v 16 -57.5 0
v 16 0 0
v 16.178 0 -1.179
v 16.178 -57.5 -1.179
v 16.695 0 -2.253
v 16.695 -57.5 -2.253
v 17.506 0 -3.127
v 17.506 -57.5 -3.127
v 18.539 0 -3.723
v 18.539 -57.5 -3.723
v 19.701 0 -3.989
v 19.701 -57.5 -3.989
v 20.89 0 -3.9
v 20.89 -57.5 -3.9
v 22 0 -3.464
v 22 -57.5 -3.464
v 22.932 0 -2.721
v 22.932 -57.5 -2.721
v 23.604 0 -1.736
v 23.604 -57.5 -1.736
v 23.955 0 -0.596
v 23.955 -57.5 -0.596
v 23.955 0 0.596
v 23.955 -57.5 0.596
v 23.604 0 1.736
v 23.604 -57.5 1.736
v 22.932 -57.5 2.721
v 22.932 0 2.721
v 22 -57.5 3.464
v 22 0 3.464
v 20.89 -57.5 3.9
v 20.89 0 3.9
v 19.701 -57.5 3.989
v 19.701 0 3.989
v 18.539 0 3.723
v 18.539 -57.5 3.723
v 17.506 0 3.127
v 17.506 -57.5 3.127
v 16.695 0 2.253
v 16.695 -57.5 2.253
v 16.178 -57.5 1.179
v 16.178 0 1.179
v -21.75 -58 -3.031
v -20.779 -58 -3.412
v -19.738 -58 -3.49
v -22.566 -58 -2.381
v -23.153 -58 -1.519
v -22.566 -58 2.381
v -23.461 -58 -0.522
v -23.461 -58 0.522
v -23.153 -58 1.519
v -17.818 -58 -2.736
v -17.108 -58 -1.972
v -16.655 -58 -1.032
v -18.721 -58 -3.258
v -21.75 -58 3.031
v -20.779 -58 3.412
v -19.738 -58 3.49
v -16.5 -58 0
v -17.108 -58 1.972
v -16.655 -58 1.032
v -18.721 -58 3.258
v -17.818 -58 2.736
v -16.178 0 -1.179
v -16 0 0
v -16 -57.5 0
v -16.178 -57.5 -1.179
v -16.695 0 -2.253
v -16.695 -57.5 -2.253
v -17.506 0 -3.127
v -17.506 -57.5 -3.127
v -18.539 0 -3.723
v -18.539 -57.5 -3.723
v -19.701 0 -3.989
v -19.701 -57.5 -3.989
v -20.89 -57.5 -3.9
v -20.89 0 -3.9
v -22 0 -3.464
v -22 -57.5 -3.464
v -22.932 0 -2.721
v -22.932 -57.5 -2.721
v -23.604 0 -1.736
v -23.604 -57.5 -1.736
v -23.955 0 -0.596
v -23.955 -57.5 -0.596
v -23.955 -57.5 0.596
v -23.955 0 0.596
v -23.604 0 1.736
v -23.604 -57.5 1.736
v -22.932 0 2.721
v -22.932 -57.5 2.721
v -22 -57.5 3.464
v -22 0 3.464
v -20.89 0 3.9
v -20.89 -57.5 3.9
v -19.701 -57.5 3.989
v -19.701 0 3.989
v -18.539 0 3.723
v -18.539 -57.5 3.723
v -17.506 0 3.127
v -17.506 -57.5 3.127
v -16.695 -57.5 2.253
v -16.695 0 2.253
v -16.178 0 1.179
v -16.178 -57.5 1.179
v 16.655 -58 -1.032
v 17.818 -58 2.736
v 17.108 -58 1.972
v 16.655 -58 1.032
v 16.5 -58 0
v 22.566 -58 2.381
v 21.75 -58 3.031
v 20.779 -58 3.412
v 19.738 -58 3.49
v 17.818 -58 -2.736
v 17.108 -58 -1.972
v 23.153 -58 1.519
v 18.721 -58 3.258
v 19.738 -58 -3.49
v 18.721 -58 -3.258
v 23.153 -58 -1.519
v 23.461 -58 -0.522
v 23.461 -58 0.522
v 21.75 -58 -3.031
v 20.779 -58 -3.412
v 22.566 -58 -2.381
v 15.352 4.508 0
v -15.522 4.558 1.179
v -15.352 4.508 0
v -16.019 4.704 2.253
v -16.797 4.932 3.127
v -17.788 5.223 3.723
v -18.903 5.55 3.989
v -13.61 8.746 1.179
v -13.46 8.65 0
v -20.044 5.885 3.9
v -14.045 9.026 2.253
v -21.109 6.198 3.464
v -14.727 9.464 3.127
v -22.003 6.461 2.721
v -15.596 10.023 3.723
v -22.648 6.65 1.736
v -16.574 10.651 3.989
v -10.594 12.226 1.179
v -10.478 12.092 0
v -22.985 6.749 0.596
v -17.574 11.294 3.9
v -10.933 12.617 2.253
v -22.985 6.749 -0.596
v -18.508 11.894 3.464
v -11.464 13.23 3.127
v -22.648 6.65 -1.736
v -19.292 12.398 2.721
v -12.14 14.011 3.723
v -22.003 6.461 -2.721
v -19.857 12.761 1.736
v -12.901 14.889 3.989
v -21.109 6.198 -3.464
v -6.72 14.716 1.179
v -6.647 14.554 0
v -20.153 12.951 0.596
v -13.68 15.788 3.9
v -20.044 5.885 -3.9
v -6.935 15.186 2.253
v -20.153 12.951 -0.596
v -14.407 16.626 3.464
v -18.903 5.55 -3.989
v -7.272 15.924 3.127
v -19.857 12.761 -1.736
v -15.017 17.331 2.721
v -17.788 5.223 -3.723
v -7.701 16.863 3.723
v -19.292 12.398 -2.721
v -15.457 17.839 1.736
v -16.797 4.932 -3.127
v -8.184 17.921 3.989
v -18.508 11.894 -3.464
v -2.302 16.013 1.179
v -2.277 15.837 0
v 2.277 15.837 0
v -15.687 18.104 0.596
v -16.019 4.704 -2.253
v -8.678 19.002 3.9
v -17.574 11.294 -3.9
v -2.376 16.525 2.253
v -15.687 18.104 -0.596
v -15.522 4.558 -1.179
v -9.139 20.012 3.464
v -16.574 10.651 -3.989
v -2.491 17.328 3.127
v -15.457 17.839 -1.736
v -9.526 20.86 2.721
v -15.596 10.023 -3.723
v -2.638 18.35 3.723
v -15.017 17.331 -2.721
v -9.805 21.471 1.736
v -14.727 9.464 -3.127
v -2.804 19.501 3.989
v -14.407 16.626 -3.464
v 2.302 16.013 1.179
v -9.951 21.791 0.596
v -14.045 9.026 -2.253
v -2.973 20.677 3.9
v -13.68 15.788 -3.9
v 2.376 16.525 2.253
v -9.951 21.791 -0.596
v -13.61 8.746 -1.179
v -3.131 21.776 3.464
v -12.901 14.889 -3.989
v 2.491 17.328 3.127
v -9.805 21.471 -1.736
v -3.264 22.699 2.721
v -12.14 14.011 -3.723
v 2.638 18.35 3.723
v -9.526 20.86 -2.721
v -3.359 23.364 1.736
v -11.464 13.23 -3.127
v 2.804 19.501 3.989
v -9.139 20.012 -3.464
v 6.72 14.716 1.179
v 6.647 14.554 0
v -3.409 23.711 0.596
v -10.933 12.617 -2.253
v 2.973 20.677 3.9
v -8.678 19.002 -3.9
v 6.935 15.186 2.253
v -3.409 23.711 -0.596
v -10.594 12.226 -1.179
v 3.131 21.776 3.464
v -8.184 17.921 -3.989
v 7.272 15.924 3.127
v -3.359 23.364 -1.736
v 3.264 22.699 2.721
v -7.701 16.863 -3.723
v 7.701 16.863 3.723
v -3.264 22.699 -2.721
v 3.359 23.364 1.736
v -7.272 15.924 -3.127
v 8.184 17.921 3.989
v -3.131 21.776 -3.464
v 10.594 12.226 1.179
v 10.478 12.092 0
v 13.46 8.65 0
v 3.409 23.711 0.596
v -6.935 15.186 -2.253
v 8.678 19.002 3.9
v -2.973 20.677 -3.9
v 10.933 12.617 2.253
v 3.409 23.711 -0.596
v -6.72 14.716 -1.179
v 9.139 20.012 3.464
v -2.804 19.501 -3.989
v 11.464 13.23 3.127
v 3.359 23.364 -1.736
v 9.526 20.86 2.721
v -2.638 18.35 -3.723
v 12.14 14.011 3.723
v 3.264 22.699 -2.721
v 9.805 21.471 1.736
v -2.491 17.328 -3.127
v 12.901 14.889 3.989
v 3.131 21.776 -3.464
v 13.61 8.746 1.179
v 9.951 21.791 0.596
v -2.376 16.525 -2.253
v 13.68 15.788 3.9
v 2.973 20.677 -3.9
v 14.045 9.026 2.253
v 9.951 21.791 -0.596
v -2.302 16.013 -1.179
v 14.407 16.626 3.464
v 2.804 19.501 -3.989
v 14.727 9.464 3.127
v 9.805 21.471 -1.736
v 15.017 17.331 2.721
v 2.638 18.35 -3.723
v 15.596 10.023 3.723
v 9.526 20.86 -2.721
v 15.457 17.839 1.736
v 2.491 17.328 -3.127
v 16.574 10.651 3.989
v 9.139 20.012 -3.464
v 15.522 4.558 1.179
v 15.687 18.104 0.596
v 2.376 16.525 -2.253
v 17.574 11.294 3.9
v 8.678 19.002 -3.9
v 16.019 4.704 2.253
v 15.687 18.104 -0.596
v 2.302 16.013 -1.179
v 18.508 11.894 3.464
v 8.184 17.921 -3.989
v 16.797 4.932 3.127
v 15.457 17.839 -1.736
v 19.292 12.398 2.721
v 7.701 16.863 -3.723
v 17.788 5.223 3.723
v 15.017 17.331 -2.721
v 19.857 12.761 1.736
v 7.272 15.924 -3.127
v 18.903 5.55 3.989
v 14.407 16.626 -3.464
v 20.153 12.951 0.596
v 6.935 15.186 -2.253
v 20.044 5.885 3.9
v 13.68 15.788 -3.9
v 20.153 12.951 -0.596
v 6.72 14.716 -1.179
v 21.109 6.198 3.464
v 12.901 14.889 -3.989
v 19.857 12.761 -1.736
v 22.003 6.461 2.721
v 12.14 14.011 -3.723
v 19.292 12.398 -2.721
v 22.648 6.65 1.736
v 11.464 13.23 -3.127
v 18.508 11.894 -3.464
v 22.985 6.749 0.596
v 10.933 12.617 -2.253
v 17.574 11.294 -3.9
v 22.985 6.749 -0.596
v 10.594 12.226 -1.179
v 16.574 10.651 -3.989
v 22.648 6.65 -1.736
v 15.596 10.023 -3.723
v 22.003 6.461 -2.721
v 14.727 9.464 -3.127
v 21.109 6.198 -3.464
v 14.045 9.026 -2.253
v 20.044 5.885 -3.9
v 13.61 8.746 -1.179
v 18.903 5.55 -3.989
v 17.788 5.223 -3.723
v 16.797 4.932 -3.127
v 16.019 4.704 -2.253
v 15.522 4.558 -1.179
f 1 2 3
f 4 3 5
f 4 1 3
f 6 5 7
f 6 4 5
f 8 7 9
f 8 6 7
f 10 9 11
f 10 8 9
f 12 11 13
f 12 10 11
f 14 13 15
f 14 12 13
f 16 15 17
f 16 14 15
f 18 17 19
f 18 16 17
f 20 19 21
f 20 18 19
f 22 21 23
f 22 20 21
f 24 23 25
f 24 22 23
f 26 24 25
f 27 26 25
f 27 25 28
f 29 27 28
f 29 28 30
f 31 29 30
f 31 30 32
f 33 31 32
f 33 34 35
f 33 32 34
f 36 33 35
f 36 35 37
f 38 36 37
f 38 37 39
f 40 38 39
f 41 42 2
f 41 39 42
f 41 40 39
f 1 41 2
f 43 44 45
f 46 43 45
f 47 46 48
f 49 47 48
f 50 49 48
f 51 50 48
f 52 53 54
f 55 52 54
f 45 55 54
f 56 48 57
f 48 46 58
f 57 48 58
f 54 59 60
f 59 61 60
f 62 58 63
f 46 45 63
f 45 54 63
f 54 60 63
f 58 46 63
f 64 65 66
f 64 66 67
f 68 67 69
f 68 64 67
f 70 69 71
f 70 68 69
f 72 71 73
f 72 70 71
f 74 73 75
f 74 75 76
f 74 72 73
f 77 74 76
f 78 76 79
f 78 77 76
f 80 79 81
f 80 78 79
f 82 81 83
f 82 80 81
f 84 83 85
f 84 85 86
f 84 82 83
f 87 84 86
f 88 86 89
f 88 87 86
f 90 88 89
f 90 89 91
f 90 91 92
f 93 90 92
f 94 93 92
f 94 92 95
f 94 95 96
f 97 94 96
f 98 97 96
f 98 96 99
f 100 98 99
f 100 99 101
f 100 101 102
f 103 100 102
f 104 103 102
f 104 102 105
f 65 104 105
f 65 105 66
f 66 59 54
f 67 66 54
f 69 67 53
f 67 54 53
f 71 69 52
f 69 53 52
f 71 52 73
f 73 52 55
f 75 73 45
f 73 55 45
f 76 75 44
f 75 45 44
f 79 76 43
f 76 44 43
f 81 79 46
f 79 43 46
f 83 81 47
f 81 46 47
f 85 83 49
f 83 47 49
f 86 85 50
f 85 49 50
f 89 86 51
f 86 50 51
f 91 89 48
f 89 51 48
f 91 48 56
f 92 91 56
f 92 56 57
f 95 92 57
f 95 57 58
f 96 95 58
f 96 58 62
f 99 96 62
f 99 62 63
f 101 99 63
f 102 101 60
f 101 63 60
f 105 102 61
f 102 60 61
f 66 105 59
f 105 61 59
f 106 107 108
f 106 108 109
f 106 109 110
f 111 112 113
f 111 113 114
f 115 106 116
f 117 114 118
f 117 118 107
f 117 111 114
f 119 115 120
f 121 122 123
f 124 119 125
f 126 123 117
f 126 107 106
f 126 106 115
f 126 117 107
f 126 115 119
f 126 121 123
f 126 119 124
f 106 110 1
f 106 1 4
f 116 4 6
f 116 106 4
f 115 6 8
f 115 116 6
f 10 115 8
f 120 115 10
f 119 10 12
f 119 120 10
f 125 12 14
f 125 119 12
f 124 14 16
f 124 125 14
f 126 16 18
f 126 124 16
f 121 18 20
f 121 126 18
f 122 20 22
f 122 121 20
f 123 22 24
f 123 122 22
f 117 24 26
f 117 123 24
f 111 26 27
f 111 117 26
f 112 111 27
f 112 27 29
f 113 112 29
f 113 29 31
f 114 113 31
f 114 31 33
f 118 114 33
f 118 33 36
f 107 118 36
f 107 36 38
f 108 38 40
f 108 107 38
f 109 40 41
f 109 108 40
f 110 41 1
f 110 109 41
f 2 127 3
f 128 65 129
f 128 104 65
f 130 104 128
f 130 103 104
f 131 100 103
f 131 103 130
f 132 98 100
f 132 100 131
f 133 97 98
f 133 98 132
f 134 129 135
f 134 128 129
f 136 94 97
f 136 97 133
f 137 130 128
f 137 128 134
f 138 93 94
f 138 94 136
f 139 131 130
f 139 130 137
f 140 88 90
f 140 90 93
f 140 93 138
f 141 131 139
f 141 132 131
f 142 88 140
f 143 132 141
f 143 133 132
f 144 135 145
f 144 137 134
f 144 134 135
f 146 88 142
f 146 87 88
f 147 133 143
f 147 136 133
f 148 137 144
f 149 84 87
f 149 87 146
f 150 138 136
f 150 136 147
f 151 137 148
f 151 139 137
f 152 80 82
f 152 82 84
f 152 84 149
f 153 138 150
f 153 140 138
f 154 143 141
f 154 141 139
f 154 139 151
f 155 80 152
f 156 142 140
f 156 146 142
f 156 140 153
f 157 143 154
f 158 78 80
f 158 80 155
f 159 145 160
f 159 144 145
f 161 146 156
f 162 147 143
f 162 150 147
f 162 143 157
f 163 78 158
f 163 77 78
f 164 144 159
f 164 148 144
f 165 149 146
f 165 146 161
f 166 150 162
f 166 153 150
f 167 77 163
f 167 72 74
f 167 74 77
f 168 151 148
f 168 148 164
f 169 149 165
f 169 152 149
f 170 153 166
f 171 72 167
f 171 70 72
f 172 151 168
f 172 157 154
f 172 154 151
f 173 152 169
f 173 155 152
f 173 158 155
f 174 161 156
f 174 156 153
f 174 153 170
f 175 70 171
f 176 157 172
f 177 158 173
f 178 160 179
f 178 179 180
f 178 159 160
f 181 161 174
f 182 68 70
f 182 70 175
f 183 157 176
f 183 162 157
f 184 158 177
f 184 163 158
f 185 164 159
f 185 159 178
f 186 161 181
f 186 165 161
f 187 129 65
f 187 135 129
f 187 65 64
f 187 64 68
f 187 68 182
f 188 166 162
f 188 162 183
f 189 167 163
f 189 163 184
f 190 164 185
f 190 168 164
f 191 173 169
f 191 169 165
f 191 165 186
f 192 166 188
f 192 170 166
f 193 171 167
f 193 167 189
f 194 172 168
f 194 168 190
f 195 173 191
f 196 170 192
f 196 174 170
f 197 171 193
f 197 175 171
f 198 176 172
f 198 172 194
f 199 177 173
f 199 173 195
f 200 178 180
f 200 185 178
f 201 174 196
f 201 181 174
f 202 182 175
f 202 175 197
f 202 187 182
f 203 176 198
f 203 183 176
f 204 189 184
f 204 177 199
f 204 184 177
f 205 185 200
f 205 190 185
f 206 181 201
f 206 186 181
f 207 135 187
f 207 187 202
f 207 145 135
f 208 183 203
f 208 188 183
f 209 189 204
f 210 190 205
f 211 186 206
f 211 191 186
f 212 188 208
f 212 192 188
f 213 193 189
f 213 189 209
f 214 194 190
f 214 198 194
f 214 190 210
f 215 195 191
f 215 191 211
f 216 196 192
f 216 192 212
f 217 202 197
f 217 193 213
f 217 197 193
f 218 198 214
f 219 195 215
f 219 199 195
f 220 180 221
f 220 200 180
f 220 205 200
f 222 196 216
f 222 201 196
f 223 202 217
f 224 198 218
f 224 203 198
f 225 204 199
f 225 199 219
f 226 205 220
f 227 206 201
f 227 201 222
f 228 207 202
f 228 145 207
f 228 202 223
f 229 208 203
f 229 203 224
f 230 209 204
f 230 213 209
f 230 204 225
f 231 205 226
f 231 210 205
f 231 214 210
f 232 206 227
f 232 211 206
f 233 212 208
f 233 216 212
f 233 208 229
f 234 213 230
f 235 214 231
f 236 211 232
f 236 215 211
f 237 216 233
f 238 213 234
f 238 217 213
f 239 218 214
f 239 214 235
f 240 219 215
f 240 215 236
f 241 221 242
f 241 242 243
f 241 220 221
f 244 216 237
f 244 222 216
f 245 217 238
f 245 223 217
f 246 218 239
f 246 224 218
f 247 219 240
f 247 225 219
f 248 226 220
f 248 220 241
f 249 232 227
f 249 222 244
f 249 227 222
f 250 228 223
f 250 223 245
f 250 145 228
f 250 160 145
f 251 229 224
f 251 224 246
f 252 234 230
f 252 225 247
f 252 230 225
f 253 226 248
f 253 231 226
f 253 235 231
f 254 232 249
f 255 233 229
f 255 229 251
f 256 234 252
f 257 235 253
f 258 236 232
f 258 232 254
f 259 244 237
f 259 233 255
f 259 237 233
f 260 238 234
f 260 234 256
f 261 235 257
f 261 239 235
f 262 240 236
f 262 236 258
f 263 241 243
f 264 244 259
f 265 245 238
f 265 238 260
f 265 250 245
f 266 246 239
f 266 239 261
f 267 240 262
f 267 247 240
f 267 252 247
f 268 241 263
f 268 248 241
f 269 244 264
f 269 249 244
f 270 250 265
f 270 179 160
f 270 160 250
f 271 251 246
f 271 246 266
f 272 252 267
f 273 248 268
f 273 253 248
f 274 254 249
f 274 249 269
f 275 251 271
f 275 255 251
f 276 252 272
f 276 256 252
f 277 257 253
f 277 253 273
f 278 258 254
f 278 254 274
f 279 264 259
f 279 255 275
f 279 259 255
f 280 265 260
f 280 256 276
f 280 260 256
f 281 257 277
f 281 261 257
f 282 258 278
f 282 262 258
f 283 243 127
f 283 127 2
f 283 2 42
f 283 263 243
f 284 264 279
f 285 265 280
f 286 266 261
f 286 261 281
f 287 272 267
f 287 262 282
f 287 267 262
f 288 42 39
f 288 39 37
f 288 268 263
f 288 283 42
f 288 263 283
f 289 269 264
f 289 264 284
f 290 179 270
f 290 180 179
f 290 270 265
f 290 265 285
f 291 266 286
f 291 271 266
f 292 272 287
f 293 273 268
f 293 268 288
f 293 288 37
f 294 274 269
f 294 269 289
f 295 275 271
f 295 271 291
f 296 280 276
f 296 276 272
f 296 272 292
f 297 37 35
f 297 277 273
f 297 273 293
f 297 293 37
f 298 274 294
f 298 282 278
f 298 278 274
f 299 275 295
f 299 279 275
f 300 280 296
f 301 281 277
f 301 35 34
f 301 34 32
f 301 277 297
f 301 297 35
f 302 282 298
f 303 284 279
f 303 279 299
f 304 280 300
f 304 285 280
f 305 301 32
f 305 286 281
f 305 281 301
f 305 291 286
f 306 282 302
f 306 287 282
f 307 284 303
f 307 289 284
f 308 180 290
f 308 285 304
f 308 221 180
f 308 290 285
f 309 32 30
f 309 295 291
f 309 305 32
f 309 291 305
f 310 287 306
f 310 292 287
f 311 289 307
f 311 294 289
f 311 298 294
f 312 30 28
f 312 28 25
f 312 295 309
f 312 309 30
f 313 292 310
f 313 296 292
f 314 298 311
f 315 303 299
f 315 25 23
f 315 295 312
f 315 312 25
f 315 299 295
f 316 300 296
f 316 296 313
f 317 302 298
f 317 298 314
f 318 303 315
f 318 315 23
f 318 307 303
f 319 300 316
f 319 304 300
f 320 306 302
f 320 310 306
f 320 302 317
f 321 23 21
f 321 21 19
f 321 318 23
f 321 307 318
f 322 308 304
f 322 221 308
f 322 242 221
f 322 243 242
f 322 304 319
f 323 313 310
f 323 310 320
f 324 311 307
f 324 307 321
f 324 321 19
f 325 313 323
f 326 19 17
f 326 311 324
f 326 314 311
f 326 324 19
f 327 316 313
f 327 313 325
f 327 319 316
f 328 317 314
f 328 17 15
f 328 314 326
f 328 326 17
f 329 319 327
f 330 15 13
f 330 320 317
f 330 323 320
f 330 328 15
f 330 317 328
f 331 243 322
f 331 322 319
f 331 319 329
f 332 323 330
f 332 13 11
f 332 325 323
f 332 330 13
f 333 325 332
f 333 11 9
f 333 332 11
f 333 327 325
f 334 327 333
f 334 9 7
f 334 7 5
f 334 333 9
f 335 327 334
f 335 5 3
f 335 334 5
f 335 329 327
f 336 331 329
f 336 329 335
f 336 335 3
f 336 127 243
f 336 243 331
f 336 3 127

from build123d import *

# Parameters (mm, degrees)
SKETCH2_R     = 4
CHAMFER1_SIZE = 0.5


with BuildPart() as part:
    # Sweep1: sweep along a path in Sketch1
    with BuildLine(Plane.XY) as sweep1_path:
        Line((-20, -58), (-20, 0))
        ThreePointArc((-20, 0), (0, 20), (20, 0))
        Line((20, 0), (20, -58))
    # Sketch2 → Sweep1 (sweep)
    with BuildSketch(Plane(origin=(0, -58, 0), x_dir=(1, 0, 0), z_dir=(0, 1, 0))):
        with Locations((-20, 0)):
            Circle(SKETCH2_R)
    sweep(path=sweep1_path.line)

    # Chamfer1
    chamfer1_edges = [part.edges().sort_by_distance(p)[0] for p in [
        (-24, -58, 0),
        (24, -58, 0),
    ]]
    chamfer(chamfer1_edges, length=CHAMFER1_SIZE)


solid = part.part
